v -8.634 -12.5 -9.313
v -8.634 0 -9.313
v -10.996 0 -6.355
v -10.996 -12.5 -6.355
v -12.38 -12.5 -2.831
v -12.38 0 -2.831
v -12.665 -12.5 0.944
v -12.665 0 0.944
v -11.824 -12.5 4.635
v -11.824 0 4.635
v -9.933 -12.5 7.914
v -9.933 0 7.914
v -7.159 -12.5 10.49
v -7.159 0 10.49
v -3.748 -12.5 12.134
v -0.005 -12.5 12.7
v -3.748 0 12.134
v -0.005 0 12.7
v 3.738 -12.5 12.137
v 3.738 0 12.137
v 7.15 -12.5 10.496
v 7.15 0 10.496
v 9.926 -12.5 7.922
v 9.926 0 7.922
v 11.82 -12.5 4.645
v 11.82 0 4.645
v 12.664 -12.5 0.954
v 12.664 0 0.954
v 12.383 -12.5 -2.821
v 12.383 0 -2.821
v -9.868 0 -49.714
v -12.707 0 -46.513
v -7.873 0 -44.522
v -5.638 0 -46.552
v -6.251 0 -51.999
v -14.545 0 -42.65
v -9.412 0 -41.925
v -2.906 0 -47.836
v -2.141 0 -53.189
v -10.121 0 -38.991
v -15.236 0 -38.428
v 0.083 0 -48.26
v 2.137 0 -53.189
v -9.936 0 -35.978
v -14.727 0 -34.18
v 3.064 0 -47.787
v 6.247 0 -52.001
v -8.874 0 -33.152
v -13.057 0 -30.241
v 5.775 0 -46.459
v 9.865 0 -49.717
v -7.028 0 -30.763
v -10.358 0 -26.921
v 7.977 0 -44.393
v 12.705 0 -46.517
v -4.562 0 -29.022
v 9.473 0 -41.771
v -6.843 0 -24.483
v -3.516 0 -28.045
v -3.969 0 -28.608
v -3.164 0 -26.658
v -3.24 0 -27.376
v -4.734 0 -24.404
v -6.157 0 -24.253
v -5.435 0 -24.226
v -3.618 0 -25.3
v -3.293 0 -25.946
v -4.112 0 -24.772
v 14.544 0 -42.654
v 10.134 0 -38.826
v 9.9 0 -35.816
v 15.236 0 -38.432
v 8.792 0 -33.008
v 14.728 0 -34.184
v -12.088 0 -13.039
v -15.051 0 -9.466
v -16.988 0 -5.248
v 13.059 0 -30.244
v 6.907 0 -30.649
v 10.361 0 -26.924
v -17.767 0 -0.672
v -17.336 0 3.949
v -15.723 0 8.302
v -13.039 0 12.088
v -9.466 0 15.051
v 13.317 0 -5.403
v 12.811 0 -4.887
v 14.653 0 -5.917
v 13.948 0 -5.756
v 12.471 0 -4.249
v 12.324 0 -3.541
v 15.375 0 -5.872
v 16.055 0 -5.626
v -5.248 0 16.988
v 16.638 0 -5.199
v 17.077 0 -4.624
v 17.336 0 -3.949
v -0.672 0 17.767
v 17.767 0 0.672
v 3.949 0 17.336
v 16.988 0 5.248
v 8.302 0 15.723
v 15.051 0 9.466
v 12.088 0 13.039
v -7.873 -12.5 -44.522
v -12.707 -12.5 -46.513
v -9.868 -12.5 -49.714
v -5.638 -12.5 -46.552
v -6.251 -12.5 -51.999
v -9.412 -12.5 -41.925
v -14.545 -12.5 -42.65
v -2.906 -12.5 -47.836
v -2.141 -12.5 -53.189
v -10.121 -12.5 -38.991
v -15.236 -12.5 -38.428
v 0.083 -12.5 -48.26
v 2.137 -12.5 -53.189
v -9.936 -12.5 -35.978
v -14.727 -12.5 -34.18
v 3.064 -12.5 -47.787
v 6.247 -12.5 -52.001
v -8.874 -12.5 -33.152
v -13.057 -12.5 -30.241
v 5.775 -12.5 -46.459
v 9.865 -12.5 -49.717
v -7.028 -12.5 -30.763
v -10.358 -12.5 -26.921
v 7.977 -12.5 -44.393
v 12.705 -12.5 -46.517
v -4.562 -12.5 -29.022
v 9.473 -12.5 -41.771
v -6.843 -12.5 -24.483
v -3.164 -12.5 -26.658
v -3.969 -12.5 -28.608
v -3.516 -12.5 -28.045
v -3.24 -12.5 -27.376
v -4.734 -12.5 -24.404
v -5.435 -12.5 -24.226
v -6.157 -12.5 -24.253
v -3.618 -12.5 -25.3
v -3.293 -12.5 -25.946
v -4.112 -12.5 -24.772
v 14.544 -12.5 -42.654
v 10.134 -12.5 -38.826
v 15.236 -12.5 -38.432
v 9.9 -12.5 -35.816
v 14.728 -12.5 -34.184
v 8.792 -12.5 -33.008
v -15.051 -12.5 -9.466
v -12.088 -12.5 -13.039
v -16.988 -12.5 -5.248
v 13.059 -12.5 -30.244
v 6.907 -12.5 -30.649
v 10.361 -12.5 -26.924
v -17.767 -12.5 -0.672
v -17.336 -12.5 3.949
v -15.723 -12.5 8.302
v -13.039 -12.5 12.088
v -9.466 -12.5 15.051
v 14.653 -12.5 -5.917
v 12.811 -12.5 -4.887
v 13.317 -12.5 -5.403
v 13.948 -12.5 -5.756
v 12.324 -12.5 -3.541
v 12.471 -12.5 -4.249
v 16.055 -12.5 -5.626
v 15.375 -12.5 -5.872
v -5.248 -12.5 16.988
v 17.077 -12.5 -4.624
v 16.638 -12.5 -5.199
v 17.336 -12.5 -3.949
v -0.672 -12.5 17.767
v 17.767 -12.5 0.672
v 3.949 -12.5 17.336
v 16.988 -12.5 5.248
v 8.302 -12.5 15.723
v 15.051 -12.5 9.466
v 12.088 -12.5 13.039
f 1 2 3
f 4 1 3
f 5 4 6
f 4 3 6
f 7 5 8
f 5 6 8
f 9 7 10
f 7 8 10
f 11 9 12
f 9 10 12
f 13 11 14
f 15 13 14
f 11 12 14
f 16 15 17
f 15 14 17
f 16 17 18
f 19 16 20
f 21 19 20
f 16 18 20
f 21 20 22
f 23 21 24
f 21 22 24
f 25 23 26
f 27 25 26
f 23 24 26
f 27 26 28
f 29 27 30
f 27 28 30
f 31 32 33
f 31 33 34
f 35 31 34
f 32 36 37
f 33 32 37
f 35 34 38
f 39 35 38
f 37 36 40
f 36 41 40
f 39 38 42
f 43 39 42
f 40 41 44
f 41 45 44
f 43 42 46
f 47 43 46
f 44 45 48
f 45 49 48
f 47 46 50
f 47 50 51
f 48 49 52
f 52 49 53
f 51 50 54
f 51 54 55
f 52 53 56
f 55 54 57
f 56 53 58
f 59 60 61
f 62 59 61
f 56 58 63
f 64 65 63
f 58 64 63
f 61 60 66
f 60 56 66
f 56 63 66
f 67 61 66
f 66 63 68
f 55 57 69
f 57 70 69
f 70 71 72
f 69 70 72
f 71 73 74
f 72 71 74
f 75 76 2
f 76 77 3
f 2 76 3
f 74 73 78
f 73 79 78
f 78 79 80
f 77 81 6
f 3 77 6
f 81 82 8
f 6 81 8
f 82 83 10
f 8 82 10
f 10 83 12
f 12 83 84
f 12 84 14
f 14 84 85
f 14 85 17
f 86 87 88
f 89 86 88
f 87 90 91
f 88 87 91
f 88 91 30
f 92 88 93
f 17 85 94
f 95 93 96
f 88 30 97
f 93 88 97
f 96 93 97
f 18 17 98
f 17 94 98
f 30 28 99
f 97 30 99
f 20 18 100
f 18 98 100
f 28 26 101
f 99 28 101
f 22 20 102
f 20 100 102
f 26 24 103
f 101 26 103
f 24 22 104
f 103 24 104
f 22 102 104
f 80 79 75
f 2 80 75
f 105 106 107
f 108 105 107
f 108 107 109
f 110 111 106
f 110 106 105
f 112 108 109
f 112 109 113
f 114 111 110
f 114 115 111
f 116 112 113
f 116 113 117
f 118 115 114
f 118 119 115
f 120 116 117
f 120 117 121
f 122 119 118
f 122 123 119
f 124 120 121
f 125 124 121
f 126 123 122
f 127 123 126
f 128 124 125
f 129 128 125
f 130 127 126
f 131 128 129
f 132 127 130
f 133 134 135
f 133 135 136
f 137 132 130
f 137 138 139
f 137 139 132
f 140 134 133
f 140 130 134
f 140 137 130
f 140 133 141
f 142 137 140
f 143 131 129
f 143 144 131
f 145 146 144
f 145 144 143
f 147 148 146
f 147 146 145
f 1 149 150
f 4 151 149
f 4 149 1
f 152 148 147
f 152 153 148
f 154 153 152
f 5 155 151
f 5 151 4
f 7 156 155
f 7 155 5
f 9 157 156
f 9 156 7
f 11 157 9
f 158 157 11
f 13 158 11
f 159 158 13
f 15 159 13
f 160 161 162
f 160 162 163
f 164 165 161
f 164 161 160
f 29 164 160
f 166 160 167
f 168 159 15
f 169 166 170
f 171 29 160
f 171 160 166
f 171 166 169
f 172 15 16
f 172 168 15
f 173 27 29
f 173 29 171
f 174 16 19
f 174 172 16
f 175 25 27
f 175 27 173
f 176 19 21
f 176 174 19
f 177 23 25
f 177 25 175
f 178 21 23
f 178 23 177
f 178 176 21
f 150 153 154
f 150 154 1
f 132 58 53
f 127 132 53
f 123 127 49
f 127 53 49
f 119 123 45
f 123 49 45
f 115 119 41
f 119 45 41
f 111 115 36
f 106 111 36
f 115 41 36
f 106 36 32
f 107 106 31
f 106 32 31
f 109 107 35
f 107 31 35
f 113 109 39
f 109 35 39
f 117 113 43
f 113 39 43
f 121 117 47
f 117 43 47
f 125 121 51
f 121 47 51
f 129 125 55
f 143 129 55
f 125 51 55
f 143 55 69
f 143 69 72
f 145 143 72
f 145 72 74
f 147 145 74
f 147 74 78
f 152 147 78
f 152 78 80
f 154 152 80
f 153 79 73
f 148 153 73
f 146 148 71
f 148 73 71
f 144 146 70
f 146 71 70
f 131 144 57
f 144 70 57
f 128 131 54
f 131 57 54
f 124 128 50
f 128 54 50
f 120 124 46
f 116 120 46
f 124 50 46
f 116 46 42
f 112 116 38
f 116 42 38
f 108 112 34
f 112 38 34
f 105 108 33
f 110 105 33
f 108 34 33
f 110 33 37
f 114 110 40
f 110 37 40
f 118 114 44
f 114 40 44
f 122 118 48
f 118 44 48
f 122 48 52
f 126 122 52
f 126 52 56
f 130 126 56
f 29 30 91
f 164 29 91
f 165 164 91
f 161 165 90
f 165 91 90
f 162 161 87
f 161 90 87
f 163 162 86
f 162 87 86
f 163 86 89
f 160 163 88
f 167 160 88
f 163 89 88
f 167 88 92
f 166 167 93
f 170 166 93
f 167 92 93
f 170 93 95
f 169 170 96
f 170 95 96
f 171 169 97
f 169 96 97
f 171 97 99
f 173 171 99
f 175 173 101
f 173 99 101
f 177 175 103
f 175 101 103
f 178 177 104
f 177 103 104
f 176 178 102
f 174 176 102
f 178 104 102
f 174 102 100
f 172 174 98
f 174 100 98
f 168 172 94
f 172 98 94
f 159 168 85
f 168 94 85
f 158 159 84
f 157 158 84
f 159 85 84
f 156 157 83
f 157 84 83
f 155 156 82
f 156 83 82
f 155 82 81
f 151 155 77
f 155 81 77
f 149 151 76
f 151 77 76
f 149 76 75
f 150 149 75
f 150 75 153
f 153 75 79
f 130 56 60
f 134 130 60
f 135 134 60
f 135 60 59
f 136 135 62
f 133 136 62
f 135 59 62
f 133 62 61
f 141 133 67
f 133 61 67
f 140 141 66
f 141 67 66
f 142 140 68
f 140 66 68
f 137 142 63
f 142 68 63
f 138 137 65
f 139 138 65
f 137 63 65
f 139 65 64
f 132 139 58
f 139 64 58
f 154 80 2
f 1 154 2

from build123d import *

# Parameters (mm, degrees)
F1_DEPTH = 12.5


with BuildPart() as f1:
    # F0 (on Front) → F1 (new body)
    with BuildSketch(Plane.XZ):
        with BuildLine():
            ThreePointArc((-8.63434, -9.313333), (-3.748413, 12.134224), (12.382753, -2.820891))
            ThreePointArc((12.382753, -2.820891), (14.295126, -5.86162), (17.335854, -3.949247))
            ThreePointArc((17.335854, -3.949247), (-5.247779, 16.987914), (-12.088076, -13.038667))
            Line((-12.088076, -13.038667), (6.907472, -30.649333))
            ThreePointArc((6.907472, -30.649333), (-1.427534, -48.159212), (-4.561795, -29.021695))
            ThreePointArc((-4.561795, -29.021695), (-3.432667, -25.61167), (-6.842692, -24.482542))
            ThreePointArc((-6.842692, -24.482542), (-2.1413, -53.188818), (10.361208, -26.924))
            Line((10.361208, -26.924), (-8.63434, -9.313333))
        make_face()
    extrude(amount=F1_DEPTH)


solid = f1.part
